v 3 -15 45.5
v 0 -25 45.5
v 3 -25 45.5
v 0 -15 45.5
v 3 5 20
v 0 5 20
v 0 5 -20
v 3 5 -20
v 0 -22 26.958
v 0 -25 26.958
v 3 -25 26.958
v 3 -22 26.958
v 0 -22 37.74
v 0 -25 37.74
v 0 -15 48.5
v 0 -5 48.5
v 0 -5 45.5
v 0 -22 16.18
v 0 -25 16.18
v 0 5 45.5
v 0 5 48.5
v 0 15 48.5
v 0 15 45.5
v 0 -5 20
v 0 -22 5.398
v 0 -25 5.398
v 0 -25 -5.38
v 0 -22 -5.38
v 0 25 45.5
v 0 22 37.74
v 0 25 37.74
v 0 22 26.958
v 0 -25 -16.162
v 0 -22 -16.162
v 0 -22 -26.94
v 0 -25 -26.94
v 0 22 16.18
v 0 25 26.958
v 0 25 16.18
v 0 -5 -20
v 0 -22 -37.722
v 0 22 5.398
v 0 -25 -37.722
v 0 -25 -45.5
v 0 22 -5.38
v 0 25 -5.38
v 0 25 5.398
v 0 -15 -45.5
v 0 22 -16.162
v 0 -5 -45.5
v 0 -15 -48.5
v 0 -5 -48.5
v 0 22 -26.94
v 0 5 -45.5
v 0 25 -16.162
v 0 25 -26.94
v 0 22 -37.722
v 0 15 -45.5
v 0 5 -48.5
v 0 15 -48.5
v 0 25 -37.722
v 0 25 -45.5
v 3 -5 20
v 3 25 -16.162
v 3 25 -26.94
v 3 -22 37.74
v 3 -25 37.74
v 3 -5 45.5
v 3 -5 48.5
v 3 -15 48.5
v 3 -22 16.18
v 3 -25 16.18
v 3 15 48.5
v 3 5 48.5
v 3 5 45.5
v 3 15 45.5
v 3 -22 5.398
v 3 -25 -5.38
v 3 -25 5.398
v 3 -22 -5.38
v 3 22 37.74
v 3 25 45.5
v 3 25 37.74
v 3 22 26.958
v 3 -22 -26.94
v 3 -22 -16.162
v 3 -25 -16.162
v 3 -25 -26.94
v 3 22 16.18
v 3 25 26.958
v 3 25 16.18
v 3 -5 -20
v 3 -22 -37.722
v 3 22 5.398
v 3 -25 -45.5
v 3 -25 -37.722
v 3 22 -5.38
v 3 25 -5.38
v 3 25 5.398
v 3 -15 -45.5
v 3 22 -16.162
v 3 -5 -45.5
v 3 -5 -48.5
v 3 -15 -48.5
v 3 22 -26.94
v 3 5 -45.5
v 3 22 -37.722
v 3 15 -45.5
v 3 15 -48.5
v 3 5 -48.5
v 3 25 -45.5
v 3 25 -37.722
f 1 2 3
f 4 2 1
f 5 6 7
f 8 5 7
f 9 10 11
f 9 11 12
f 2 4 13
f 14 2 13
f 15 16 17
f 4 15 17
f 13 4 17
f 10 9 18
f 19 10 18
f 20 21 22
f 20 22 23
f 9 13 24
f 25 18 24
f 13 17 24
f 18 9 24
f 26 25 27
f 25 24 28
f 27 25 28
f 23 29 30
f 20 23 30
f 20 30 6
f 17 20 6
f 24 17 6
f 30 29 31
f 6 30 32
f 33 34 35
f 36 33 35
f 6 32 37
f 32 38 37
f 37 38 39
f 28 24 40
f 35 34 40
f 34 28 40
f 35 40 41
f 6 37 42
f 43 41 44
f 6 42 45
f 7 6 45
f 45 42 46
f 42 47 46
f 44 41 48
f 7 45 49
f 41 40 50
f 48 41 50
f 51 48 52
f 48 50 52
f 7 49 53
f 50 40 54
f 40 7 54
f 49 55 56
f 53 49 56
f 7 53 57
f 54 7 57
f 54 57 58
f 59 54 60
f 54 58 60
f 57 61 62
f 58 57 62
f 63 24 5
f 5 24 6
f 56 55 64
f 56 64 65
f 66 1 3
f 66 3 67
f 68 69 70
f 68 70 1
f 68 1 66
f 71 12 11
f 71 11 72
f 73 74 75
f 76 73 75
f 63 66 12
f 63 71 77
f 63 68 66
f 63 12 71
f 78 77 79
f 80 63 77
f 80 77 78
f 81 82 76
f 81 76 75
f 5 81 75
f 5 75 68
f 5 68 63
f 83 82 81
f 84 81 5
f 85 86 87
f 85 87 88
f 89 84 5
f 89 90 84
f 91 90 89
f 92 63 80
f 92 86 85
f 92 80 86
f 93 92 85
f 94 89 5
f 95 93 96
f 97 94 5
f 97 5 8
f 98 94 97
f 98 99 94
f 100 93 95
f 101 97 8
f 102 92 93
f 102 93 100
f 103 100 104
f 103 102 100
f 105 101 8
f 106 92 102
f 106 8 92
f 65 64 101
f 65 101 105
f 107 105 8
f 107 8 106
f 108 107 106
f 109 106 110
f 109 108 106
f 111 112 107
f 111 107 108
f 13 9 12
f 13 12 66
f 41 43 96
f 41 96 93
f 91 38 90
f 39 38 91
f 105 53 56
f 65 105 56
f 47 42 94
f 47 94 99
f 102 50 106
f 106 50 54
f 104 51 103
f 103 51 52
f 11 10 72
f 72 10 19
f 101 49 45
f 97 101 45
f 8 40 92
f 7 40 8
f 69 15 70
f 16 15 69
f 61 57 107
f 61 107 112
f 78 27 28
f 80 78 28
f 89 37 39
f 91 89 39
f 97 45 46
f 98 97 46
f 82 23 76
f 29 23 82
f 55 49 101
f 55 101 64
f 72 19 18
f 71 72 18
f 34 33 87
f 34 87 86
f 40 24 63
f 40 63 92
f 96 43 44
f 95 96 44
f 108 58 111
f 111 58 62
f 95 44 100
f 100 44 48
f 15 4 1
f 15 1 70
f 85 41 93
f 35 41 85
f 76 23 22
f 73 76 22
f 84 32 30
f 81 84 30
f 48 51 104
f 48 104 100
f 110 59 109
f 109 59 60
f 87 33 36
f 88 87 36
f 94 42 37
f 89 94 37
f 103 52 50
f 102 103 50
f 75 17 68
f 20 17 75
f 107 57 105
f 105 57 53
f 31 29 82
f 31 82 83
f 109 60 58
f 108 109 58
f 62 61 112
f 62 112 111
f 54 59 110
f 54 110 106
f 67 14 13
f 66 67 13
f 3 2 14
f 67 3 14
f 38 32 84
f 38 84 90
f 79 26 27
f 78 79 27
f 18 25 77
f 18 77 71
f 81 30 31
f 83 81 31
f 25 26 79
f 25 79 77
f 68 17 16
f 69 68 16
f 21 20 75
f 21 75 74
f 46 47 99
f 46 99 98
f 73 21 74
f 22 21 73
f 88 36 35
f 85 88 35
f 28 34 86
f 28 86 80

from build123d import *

# Parameters (mm, degrees)
ESBO_O1_W                = 97
ESBO_O1_H                = 50
RESSALTO_EXTRUS_O1_DEPTH = 3
CORTE_EXTRUS_O1_REACH    = 56.647
ESBO_O2_W                = 10.782222222
ESBO_O2_H                = 3
CORTE_EXTRUS_O2_REACH    = 56.647
ESBO_O4_W                = 3
ESBO_O4_H                = 10
CORTE_EXTRUS_O5_REACH    = 56.647
ESBO_O3_W                = 40
ESBO_O3_H                = 10


with BuildPart() as part:
    # Esboço1 → Ressalto-extrusão1 (new body)
    with BuildSketch(Plane(origin=(0, 0, 0), x_dir=(0, 0, -1), z_dir=(1, 0, 0))):
        Rectangle(ESBO_O1_W, ESBO_O1_H)
    extrude(amount=RESSALTO_EXTRUS_O1_DEPTH)

    # Esboço2 → Corte-extrusão1 (cut, up to next)
    with BuildSketch(Plane.ZY, mode=Mode.PRIVATE) as corte_extrus_o1_sk1:
        with Locations((-10.771111111, 23.5)):
            Rectangle(ESBO_O2_W, ESBO_O2_H)
    corte_extrus_o1_tool1 = extrude(corte_extrus_o1_sk1.sketch, amount=-CORTE_EXTRUS_O1_REACH, mode=Mode.PRIVATE) & part.part
    # Esboço2 → Corte-extrusão1 (cut, up to next)
    with BuildSketch(Plane.ZY, mode=Mode.PRIVATE) as corte_extrus_o1_sk2:
        with Locations((-32.331111111, 23.5)):
            Rectangle(ESBO_O2_W, ESBO_O2_H)
    corte_extrus_o1_tool2 = extrude(corte_extrus_o1_sk2.sketch, amount=-CORTE_EXTRUS_O1_REACH, mode=Mode.PRIVATE) & part.part
    # Esboço2 → Corte-extrusão1 (cut, up to next)
    with BuildSketch(Plane.ZY, mode=Mode.PRIVATE) as corte_extrus_o1_sk3:
        with Locations((10.788888889, 23.5)):
            Rectangle(ESBO_O2_W, ESBO_O2_H)
    corte_extrus_o1_tool3 = extrude(corte_extrus_o1_sk3.sketch, amount=-CORTE_EXTRUS_O1_REACH, mode=Mode.PRIVATE) & part.part
    # Esboço2 → Corte-extrusão1 (cut, up to next)
    with BuildSketch(Plane.ZY, mode=Mode.PRIVATE) as corte_extrus_o1_sk4:
        with Locations((32.348888889, 23.5)):
            Rectangle(ESBO_O2_W, ESBO_O2_H)
    corte_extrus_o1_tool4 = extrude(corte_extrus_o1_sk4.sketch, amount=-CORTE_EXTRUS_O1_REACH, mode=Mode.PRIVATE) & part.part
    # Esboço2 → Corte-extrusão1 (cut, up to next)
    with BuildSketch(Plane.ZY, mode=Mode.PRIVATE) as corte_extrus_o1_sk5:
        with Locations((-32.331111111, -23.5)):
            Rectangle(ESBO_O2_W, ESBO_O2_H)
    corte_extrus_o1_tool5 = extrude(corte_extrus_o1_sk5.sketch, amount=-CORTE_EXTRUS_O1_REACH, mode=Mode.PRIVATE) & part.part
    # Esboço2 → Corte-extrusão1 (cut, up to next)
    with BuildSketch(Plane.ZY, mode=Mode.PRIVATE) as corte_extrus_o1_sk6:
        with Locations((32.348888889, -23.5)):
            Rectangle(ESBO_O2_W, ESBO_O2_H)
    corte_extrus_o1_tool6 = extrude(corte_extrus_o1_sk6.sketch, amount=-CORTE_EXTRUS_O1_REACH, mode=Mode.PRIVATE) & part.part
    # Esboço2 → Corte-extrusão1 (cut, up to next)
    with BuildSketch(Plane.ZY, mode=Mode.PRIVATE) as corte_extrus_o1_sk7:
        with Locations((-10.771111111, -23.5)):
            Rectangle(ESBO_O2_W, ESBO_O2_H)
    corte_extrus_o1_tool7 = extrude(corte_extrus_o1_sk7.sketch, amount=-CORTE_EXTRUS_O1_REACH, mode=Mode.PRIVATE) & part.part
    # Esboço2 → Corte-extrusão1 (cut, up to next)
    with BuildSketch(Plane.ZY, mode=Mode.PRIVATE) as corte_extrus_o1_sk8:
        with Locations((10.788888889, -23.5)):
            Rectangle(ESBO_O2_W, ESBO_O2_H)
    corte_extrus_o1_tool8 = extrude(corte_extrus_o1_sk8.sketch, amount=-CORTE_EXTRUS_O1_REACH, mode=Mode.PRIVATE) & part.part
    add(corte_extrus_o1_tool1.solids().sort_by_distance((0, 23.5, -10.771111))[0], mode=Mode.SUBTRACT)
    add(corte_extrus_o1_tool2.solids().sort_by_distance((0, 23.5, -32.331111))[0], mode=Mode.SUBTRACT)
    add(corte_extrus_o1_tool3.solids().sort_by_distance((0, 23.5, 10.788889))[0], mode=Mode.SUBTRACT)
    add(corte_extrus_o1_tool4.solids().sort_by_distance((0, 23.5, 32.348889))[0], mode=Mode.SUBTRACT)
    add(corte_extrus_o1_tool5.solids().sort_by_distance((0, -23.5, -32.331111))[0], mode=Mode.SUBTRACT)
    add(corte_extrus_o1_tool6.solids().sort_by_distance((0, -23.5, 32.348889))[0], mode=Mode.SUBTRACT)
    add(corte_extrus_o1_tool7.solids().sort_by_distance((0, -23.5, -10.771111))[0], mode=Mode.SUBTRACT)
    add(corte_extrus_o1_tool8.solids().sort_by_distance((0, -23.5, 10.788889))[0], mode=Mode.SUBTRACT)

    # Esboço4 → Corte-extrusão2 (cut, up to next)
    with BuildSketch(Plane.ZY, mode=Mode.PRIVATE) as corte_extrus_o2_sk1:
        with Locations((47, 20)):
            Rectangle(ESBO_O4_W, ESBO_O4_H)
    corte_extrus_o2_tool1 = extrude(corte_extrus_o2_sk1.sketch, amount=-CORTE_EXTRUS_O2_REACH, mode=Mode.PRIVATE) & part.part
    # Esboço4 → Corte-extrusão2 (cut, up to next)
    with BuildSketch(Plane.ZY, mode=Mode.PRIVATE) as corte_extrus_o2_sk2:
        with Locations((-47, -20)):
            Rectangle(ESBO_O4_W, ESBO_O4_H)
    corte_extrus_o2_tool2 = extrude(corte_extrus_o2_sk2.sketch, amount=-CORTE_EXTRUS_O2_REACH, mode=Mode.PRIVATE) & part.part
    # Esboço4 → Corte-extrusão2 (cut, up to next)
    with BuildSketch(Plane.ZY, mode=Mode.PRIVATE) as corte_extrus_o2_sk3:
        with Locations((-47, 20)):
            Rectangle(ESBO_O4_W, ESBO_O4_H)
    corte_extrus_o2_tool3 = extrude(corte_extrus_o2_sk3.sketch, amount=-CORTE_EXTRUS_O2_REACH, mode=Mode.PRIVATE) & part.part
    # Esboço4 → Corte-extrusão2 (cut, up to next)
    with BuildSketch(Plane.ZY, mode=Mode.PRIVATE) as corte_extrus_o2_sk4:
        with Locations((47, -20)):
            Rectangle(ESBO_O4_W, ESBO_O4_H)
    corte_extrus_o2_tool4 = extrude(corte_extrus_o2_sk4.sketch, amount=-CORTE_EXTRUS_O2_REACH, mode=Mode.PRIVATE) & part.part
    # Esboço4 → Corte-extrusão2 (cut, up to next)
    with BuildSketch(Plane.ZY, mode=Mode.PRIVATE) as corte_extrus_o2_sk5:
        with Locations((47, 0)):
            Rectangle(ESBO_O4_W, ESBO_O4_H)
    corte_extrus_o2_tool5 = extrude(corte_extrus_o2_sk5.sketch, amount=-CORTE_EXTRUS_O2_REACH, mode=Mode.PRIVATE) & part.part
    # Esboço4 → Corte-extrusão2 (cut, up to next)
    with BuildSketch(Plane.ZY, mode=Mode.PRIVATE) as corte_extrus_o2_sk6:
        with Locations((-47, 0)):
            Rectangle(ESBO_O4_W, ESBO_O4_H)
    corte_extrus_o2_tool6 = extrude(corte_extrus_o2_sk6.sketch, amount=-CORTE_EXTRUS_O2_REACH, mode=Mode.PRIVATE) & part.part
    add(corte_extrus_o2_tool1.solids().sort_by_distance((0, 20, 47))[0], mode=Mode.SUBTRACT)
    add(corte_extrus_o2_tool2.solids().sort_by_distance((0, -20, -47))[0], mode=Mode.SUBTRACT)
    add(corte_extrus_o2_tool3.solids().sort_by_distance((0, 20, -47))[0], mode=Mode.SUBTRACT)
    add(corte_extrus_o2_tool4.solids().sort_by_distance((0, -20, 47))[0], mode=Mode.SUBTRACT)
    add(corte_extrus_o2_tool5.solids().sort_by_distance((0, 0, 47))[0], mode=Mode.SUBTRACT)
    add(corte_extrus_o2_tool6.solids().sort_by_distance((0, 0, -47))[0], mode=Mode.SUBTRACT)

    # Esboço3 → Corte-extrusão5 (cut, up to next)
    with BuildSketch(Plane(origin=(0, 0, 0), x_dir=(0, 0, -1), z_dir=(1, 0, 0)), mode=Mode.PRIVATE) as corte_extrus_o5_sk1:
        Rectangle(ESBO_O3_W, ESBO_O3_H)
    corte_extrus_o5_tool1 = extrude(corte_extrus_o5_sk1.sketch, amount=CORTE_EXTRUS_O5_REACH, mode=Mode.PRIVATE) & part.part
    add(corte_extrus_o5_tool1.solids().sort_by_distance((0, 0, 0))[0], mode=Mode.SUBTRACT)


solid = part.part
